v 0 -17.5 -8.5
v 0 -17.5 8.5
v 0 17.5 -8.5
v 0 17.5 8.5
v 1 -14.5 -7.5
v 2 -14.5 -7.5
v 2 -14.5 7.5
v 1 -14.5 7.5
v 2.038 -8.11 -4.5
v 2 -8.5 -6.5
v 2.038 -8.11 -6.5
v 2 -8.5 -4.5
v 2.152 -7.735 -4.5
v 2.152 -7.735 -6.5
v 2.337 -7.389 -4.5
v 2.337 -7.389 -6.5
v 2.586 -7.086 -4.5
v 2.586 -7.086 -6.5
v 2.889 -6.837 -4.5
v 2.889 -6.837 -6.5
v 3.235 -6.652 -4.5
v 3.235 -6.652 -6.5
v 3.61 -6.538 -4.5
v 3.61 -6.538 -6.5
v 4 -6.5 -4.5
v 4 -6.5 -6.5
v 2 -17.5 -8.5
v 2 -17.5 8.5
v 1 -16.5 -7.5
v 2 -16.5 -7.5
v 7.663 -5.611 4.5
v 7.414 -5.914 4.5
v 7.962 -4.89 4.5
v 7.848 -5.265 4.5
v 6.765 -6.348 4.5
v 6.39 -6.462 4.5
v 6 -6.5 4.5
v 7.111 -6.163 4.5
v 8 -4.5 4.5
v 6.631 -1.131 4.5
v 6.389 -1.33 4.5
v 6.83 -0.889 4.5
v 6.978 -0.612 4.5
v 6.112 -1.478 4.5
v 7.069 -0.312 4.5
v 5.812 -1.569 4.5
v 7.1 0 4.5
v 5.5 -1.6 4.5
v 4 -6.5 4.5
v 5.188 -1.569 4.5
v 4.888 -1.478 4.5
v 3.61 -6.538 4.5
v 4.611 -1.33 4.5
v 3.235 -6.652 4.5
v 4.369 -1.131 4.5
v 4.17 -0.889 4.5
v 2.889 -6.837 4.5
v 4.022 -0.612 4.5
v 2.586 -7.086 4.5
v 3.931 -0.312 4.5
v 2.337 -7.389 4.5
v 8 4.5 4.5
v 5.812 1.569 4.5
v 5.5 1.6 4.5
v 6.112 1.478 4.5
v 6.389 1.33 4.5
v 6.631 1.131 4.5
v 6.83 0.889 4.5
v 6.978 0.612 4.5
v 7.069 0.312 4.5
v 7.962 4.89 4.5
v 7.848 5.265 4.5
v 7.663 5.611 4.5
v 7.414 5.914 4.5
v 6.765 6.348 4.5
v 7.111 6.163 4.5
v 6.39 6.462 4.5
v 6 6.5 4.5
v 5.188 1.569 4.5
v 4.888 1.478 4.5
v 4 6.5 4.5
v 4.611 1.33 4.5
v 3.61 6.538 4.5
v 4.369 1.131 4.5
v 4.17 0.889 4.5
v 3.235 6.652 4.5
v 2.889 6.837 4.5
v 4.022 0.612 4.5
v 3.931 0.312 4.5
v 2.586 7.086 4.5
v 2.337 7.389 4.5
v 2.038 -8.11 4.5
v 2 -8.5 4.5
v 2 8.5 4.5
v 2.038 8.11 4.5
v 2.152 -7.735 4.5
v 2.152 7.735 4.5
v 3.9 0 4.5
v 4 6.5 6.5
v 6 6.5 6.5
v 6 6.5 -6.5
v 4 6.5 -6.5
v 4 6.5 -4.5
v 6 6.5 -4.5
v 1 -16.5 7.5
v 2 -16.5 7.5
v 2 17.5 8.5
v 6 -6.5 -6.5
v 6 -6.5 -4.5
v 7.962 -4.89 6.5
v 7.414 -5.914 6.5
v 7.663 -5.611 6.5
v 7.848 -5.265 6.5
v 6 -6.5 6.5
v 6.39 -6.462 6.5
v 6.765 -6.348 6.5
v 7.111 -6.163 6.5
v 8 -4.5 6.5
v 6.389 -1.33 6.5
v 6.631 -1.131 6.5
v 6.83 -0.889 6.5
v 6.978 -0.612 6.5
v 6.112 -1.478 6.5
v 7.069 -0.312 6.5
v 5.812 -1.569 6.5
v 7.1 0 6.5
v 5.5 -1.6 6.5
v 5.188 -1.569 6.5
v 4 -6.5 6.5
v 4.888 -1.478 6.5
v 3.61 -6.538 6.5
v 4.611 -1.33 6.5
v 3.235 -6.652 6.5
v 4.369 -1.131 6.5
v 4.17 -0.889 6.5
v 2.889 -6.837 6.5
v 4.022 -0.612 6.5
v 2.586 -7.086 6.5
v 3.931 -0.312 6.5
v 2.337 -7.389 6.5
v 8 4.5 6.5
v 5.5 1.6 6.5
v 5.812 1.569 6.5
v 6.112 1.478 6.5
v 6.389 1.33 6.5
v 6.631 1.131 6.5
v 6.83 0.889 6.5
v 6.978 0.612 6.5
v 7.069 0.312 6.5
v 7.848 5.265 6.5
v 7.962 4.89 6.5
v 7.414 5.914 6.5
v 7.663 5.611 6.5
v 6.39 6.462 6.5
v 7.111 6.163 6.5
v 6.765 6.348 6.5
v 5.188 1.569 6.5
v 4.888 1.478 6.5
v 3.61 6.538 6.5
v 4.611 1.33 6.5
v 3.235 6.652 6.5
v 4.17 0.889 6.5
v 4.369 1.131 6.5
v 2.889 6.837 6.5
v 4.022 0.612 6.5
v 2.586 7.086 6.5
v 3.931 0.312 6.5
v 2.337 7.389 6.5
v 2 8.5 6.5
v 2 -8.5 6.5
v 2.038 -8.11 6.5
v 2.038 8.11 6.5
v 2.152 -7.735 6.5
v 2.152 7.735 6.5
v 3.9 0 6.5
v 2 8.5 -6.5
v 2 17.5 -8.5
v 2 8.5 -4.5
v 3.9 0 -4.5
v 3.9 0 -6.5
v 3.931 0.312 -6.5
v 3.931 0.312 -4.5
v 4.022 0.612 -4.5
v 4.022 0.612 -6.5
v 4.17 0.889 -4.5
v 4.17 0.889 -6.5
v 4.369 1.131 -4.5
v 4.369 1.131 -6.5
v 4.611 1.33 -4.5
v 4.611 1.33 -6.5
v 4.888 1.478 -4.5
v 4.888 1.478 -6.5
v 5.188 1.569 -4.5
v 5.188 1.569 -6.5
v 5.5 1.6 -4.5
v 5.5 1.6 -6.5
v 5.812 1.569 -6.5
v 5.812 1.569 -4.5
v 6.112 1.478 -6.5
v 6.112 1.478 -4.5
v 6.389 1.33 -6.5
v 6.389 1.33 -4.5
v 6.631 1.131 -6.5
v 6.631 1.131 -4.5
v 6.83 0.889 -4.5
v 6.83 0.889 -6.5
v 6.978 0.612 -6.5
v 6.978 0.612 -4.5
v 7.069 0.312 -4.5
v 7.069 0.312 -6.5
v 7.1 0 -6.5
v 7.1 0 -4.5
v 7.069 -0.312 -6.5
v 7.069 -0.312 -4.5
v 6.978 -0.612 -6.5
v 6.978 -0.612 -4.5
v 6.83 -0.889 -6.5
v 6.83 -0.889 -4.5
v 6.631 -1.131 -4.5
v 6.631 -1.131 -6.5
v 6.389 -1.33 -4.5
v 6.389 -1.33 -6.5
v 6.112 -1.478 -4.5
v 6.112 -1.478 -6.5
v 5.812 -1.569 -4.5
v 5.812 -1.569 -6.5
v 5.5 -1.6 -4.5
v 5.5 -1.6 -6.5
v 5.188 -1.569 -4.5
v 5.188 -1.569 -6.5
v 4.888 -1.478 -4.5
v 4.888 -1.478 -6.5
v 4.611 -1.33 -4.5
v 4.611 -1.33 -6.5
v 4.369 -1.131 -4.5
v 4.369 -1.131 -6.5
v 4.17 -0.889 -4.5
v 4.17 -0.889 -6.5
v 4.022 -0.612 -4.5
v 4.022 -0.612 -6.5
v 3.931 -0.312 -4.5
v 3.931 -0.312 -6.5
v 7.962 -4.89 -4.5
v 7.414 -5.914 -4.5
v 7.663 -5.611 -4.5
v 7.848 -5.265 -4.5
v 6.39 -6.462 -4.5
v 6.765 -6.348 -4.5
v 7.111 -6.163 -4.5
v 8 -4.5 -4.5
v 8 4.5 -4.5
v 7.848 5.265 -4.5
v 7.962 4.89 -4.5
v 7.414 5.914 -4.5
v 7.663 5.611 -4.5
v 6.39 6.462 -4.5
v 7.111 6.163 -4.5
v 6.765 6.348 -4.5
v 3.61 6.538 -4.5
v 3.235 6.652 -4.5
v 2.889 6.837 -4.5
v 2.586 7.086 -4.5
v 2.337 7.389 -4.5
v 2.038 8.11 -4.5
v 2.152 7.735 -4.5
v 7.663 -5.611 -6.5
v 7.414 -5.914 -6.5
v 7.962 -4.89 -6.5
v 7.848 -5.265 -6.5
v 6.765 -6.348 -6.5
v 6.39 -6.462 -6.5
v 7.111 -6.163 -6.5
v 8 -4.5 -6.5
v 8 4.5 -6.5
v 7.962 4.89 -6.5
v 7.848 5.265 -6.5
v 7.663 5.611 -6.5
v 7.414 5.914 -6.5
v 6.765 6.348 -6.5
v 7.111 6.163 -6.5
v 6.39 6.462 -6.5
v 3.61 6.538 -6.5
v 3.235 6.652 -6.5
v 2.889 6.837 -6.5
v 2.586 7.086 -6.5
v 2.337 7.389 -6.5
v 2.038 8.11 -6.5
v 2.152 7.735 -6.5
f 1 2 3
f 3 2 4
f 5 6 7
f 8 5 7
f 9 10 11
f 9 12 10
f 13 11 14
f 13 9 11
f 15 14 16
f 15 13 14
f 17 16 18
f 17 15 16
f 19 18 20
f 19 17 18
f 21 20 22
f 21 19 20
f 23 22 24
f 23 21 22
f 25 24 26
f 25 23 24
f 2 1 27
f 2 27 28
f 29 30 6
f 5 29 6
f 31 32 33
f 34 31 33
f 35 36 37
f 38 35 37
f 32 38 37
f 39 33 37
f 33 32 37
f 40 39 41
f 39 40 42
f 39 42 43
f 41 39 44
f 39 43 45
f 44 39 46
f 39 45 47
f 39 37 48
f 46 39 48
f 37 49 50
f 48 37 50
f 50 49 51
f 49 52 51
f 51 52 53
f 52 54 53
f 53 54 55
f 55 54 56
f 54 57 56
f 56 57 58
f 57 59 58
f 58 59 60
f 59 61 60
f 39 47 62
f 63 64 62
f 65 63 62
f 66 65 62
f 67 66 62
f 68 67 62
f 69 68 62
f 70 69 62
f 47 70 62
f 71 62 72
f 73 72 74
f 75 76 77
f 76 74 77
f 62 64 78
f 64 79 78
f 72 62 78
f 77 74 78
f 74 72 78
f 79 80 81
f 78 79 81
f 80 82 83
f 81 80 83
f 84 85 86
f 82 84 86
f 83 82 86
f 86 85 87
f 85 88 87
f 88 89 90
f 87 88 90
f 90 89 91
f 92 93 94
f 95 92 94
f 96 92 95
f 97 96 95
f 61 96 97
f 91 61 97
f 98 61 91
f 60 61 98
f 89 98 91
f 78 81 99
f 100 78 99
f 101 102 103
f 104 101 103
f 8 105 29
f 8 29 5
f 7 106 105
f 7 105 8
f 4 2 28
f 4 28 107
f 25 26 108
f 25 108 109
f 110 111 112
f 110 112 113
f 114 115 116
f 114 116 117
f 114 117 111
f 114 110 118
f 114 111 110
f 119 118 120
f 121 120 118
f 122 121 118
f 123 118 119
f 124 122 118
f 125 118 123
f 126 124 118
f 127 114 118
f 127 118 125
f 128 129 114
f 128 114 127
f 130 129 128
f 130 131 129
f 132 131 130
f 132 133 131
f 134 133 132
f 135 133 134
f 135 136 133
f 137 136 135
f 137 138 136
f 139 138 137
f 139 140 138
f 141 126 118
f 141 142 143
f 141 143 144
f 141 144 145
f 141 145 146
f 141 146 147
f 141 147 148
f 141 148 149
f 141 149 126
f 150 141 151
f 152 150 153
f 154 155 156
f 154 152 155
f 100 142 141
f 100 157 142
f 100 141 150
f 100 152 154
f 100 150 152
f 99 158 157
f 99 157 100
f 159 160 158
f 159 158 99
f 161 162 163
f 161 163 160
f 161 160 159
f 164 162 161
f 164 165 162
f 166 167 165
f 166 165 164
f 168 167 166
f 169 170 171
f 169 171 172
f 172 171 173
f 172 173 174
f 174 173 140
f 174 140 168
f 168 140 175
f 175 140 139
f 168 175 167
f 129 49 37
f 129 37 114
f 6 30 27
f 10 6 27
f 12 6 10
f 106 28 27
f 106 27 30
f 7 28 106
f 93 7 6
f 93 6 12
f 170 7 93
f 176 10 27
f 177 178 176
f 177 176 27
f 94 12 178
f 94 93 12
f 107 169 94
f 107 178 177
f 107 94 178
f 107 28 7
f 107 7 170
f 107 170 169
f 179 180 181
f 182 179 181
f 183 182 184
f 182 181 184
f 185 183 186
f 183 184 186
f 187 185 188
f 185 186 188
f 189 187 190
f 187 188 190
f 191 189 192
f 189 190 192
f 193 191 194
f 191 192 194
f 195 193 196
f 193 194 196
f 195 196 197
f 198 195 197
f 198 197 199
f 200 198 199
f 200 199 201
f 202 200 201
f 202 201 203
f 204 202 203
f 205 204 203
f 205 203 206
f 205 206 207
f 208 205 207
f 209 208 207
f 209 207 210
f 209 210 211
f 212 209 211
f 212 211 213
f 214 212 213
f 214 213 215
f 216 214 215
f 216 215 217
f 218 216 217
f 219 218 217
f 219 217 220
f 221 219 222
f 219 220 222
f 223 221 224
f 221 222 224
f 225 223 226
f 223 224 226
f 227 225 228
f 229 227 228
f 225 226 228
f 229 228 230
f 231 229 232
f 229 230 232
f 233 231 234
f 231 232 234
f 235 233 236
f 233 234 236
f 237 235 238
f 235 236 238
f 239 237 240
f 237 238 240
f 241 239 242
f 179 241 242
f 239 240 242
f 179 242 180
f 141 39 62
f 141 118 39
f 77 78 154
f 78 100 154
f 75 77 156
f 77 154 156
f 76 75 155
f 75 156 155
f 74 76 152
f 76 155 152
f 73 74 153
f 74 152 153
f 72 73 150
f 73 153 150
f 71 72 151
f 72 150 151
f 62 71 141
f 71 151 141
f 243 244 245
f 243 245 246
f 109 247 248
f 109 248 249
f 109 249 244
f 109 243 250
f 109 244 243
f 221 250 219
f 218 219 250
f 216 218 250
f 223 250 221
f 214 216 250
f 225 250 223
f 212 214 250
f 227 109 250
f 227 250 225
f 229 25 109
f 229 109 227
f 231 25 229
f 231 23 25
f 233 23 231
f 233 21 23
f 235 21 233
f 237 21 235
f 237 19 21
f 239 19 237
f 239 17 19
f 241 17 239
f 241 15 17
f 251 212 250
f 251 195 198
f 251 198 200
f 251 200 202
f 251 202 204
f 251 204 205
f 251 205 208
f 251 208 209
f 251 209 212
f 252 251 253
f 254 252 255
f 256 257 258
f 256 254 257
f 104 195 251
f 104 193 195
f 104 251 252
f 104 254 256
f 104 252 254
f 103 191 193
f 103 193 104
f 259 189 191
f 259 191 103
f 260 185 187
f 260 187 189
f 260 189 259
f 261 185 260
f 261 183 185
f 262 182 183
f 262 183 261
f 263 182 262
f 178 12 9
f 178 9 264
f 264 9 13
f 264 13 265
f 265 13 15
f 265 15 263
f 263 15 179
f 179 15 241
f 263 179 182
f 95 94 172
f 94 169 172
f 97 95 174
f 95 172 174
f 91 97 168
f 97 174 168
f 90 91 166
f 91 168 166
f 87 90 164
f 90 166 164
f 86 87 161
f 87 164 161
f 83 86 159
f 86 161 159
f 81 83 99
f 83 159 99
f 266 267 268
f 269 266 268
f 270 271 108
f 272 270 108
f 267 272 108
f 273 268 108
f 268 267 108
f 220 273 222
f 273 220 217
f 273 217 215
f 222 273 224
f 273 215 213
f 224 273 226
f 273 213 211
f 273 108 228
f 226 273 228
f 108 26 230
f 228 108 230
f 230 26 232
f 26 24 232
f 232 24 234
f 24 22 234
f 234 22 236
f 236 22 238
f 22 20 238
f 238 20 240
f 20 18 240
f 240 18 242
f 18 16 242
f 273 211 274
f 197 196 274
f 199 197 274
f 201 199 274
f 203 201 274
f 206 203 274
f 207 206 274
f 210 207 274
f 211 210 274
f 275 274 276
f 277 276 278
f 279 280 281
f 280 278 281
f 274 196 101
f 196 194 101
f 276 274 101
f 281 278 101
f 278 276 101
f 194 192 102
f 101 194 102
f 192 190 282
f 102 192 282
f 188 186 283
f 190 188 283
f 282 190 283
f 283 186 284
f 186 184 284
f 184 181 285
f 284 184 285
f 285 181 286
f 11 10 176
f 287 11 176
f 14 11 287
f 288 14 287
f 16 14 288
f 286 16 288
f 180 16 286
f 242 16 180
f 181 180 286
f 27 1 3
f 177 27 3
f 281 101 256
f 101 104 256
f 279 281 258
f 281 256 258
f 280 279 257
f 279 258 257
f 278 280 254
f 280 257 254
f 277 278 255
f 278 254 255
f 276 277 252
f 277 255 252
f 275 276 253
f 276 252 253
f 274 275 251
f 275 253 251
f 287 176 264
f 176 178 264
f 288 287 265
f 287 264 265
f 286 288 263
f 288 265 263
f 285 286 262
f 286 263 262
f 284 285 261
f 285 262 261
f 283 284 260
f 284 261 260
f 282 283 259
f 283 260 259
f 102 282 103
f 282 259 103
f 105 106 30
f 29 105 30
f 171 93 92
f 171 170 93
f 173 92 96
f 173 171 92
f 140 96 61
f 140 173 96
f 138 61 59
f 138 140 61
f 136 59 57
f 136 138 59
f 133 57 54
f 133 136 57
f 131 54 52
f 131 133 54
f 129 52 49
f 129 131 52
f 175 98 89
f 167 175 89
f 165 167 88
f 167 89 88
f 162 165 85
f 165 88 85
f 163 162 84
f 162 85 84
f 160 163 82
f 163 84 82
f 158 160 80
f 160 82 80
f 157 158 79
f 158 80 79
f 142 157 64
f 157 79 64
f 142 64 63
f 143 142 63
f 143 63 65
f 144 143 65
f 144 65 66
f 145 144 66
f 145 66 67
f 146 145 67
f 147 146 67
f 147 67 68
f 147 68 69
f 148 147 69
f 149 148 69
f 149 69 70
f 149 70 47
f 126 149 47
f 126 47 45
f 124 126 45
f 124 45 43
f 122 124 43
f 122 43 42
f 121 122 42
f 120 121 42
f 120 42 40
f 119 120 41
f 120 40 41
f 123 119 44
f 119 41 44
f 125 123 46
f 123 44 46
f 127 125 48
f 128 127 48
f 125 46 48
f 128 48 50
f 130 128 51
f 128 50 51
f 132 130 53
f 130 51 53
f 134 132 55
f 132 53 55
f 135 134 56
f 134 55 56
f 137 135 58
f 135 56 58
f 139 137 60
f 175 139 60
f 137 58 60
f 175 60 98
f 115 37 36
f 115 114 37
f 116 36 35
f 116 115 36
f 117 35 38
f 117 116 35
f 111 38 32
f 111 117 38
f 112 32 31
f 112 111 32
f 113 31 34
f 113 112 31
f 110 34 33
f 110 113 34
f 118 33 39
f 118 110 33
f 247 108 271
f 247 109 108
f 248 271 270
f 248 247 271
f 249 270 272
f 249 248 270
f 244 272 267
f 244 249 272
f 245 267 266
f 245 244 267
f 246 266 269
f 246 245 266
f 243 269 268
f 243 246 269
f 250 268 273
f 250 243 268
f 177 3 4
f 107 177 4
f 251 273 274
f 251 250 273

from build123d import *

# Parameters (mm, degrees)
F0_W     = 35
F0_H     = 17
F1_DEPTH = 2
F2_W     = 2
F2_H     = 13
F2_H_2   = 1
F3_DEPTH = 1
F4_W     = 13
F4_H     = 2
F5_DEPTH = 6
F7_D     = 3.2
F8_R     = 2


with BuildPart() as f1:
    # F0 (on Right) → F1 (new body)
    with BuildSketch(Plane.YZ):
        Rectangle(F0_W, F0_H)
    extrude(amount=F1_DEPTH)

    # F2 (on face) → F3 (cut)
    with BuildSketch(Plane.YZ.offset(2)):
        with Locations((-15.5, 0)):
            Rectangle(F2_W, F2_H)
        with Locations((-15.5, 7)):
            Rectangle(F2_W, F2_H_2)
        with Locations((-15.5, -7)):
            Rectangle(F2_W, F2_H_2)
    extrude(amount=-F3_DEPTH, mode=Mode.SUBTRACT)

    # F4 (on face) → F5 (join)
    with BuildSketch(Plane.YZ.offset(2)):
        with Locations((0, 5.5)):
            Rectangle(F4_W, F4_H)
        with Locations((0, -5.5)):
            Rectangle(F4_W, F4_H)
    extrude(amount=F5_DEPTH)

    # F7 (through all)
    with Locations(Plane.XY.offset(6.5)):
        with Locations((5.5, 0)):
            Hole(F7_D / 2)

    # F8
    f8_edges = [f1.edges().sort_by_distance(p)[0] for p in [
        (2, 6.5, 5.5),
        (8, 6.5, 5.5),
        (8, 6.5, -5.5),
        (2, 6.5, -5.5),
        (2, -6.5, -5.5),
        (8, -6.5, -5.5),
        (2, -6.5, 5.5),
        (8, -6.5, 5.5),
    ]]
    fillet(f8_edges, radius=F8_R)


solid = f1.part
